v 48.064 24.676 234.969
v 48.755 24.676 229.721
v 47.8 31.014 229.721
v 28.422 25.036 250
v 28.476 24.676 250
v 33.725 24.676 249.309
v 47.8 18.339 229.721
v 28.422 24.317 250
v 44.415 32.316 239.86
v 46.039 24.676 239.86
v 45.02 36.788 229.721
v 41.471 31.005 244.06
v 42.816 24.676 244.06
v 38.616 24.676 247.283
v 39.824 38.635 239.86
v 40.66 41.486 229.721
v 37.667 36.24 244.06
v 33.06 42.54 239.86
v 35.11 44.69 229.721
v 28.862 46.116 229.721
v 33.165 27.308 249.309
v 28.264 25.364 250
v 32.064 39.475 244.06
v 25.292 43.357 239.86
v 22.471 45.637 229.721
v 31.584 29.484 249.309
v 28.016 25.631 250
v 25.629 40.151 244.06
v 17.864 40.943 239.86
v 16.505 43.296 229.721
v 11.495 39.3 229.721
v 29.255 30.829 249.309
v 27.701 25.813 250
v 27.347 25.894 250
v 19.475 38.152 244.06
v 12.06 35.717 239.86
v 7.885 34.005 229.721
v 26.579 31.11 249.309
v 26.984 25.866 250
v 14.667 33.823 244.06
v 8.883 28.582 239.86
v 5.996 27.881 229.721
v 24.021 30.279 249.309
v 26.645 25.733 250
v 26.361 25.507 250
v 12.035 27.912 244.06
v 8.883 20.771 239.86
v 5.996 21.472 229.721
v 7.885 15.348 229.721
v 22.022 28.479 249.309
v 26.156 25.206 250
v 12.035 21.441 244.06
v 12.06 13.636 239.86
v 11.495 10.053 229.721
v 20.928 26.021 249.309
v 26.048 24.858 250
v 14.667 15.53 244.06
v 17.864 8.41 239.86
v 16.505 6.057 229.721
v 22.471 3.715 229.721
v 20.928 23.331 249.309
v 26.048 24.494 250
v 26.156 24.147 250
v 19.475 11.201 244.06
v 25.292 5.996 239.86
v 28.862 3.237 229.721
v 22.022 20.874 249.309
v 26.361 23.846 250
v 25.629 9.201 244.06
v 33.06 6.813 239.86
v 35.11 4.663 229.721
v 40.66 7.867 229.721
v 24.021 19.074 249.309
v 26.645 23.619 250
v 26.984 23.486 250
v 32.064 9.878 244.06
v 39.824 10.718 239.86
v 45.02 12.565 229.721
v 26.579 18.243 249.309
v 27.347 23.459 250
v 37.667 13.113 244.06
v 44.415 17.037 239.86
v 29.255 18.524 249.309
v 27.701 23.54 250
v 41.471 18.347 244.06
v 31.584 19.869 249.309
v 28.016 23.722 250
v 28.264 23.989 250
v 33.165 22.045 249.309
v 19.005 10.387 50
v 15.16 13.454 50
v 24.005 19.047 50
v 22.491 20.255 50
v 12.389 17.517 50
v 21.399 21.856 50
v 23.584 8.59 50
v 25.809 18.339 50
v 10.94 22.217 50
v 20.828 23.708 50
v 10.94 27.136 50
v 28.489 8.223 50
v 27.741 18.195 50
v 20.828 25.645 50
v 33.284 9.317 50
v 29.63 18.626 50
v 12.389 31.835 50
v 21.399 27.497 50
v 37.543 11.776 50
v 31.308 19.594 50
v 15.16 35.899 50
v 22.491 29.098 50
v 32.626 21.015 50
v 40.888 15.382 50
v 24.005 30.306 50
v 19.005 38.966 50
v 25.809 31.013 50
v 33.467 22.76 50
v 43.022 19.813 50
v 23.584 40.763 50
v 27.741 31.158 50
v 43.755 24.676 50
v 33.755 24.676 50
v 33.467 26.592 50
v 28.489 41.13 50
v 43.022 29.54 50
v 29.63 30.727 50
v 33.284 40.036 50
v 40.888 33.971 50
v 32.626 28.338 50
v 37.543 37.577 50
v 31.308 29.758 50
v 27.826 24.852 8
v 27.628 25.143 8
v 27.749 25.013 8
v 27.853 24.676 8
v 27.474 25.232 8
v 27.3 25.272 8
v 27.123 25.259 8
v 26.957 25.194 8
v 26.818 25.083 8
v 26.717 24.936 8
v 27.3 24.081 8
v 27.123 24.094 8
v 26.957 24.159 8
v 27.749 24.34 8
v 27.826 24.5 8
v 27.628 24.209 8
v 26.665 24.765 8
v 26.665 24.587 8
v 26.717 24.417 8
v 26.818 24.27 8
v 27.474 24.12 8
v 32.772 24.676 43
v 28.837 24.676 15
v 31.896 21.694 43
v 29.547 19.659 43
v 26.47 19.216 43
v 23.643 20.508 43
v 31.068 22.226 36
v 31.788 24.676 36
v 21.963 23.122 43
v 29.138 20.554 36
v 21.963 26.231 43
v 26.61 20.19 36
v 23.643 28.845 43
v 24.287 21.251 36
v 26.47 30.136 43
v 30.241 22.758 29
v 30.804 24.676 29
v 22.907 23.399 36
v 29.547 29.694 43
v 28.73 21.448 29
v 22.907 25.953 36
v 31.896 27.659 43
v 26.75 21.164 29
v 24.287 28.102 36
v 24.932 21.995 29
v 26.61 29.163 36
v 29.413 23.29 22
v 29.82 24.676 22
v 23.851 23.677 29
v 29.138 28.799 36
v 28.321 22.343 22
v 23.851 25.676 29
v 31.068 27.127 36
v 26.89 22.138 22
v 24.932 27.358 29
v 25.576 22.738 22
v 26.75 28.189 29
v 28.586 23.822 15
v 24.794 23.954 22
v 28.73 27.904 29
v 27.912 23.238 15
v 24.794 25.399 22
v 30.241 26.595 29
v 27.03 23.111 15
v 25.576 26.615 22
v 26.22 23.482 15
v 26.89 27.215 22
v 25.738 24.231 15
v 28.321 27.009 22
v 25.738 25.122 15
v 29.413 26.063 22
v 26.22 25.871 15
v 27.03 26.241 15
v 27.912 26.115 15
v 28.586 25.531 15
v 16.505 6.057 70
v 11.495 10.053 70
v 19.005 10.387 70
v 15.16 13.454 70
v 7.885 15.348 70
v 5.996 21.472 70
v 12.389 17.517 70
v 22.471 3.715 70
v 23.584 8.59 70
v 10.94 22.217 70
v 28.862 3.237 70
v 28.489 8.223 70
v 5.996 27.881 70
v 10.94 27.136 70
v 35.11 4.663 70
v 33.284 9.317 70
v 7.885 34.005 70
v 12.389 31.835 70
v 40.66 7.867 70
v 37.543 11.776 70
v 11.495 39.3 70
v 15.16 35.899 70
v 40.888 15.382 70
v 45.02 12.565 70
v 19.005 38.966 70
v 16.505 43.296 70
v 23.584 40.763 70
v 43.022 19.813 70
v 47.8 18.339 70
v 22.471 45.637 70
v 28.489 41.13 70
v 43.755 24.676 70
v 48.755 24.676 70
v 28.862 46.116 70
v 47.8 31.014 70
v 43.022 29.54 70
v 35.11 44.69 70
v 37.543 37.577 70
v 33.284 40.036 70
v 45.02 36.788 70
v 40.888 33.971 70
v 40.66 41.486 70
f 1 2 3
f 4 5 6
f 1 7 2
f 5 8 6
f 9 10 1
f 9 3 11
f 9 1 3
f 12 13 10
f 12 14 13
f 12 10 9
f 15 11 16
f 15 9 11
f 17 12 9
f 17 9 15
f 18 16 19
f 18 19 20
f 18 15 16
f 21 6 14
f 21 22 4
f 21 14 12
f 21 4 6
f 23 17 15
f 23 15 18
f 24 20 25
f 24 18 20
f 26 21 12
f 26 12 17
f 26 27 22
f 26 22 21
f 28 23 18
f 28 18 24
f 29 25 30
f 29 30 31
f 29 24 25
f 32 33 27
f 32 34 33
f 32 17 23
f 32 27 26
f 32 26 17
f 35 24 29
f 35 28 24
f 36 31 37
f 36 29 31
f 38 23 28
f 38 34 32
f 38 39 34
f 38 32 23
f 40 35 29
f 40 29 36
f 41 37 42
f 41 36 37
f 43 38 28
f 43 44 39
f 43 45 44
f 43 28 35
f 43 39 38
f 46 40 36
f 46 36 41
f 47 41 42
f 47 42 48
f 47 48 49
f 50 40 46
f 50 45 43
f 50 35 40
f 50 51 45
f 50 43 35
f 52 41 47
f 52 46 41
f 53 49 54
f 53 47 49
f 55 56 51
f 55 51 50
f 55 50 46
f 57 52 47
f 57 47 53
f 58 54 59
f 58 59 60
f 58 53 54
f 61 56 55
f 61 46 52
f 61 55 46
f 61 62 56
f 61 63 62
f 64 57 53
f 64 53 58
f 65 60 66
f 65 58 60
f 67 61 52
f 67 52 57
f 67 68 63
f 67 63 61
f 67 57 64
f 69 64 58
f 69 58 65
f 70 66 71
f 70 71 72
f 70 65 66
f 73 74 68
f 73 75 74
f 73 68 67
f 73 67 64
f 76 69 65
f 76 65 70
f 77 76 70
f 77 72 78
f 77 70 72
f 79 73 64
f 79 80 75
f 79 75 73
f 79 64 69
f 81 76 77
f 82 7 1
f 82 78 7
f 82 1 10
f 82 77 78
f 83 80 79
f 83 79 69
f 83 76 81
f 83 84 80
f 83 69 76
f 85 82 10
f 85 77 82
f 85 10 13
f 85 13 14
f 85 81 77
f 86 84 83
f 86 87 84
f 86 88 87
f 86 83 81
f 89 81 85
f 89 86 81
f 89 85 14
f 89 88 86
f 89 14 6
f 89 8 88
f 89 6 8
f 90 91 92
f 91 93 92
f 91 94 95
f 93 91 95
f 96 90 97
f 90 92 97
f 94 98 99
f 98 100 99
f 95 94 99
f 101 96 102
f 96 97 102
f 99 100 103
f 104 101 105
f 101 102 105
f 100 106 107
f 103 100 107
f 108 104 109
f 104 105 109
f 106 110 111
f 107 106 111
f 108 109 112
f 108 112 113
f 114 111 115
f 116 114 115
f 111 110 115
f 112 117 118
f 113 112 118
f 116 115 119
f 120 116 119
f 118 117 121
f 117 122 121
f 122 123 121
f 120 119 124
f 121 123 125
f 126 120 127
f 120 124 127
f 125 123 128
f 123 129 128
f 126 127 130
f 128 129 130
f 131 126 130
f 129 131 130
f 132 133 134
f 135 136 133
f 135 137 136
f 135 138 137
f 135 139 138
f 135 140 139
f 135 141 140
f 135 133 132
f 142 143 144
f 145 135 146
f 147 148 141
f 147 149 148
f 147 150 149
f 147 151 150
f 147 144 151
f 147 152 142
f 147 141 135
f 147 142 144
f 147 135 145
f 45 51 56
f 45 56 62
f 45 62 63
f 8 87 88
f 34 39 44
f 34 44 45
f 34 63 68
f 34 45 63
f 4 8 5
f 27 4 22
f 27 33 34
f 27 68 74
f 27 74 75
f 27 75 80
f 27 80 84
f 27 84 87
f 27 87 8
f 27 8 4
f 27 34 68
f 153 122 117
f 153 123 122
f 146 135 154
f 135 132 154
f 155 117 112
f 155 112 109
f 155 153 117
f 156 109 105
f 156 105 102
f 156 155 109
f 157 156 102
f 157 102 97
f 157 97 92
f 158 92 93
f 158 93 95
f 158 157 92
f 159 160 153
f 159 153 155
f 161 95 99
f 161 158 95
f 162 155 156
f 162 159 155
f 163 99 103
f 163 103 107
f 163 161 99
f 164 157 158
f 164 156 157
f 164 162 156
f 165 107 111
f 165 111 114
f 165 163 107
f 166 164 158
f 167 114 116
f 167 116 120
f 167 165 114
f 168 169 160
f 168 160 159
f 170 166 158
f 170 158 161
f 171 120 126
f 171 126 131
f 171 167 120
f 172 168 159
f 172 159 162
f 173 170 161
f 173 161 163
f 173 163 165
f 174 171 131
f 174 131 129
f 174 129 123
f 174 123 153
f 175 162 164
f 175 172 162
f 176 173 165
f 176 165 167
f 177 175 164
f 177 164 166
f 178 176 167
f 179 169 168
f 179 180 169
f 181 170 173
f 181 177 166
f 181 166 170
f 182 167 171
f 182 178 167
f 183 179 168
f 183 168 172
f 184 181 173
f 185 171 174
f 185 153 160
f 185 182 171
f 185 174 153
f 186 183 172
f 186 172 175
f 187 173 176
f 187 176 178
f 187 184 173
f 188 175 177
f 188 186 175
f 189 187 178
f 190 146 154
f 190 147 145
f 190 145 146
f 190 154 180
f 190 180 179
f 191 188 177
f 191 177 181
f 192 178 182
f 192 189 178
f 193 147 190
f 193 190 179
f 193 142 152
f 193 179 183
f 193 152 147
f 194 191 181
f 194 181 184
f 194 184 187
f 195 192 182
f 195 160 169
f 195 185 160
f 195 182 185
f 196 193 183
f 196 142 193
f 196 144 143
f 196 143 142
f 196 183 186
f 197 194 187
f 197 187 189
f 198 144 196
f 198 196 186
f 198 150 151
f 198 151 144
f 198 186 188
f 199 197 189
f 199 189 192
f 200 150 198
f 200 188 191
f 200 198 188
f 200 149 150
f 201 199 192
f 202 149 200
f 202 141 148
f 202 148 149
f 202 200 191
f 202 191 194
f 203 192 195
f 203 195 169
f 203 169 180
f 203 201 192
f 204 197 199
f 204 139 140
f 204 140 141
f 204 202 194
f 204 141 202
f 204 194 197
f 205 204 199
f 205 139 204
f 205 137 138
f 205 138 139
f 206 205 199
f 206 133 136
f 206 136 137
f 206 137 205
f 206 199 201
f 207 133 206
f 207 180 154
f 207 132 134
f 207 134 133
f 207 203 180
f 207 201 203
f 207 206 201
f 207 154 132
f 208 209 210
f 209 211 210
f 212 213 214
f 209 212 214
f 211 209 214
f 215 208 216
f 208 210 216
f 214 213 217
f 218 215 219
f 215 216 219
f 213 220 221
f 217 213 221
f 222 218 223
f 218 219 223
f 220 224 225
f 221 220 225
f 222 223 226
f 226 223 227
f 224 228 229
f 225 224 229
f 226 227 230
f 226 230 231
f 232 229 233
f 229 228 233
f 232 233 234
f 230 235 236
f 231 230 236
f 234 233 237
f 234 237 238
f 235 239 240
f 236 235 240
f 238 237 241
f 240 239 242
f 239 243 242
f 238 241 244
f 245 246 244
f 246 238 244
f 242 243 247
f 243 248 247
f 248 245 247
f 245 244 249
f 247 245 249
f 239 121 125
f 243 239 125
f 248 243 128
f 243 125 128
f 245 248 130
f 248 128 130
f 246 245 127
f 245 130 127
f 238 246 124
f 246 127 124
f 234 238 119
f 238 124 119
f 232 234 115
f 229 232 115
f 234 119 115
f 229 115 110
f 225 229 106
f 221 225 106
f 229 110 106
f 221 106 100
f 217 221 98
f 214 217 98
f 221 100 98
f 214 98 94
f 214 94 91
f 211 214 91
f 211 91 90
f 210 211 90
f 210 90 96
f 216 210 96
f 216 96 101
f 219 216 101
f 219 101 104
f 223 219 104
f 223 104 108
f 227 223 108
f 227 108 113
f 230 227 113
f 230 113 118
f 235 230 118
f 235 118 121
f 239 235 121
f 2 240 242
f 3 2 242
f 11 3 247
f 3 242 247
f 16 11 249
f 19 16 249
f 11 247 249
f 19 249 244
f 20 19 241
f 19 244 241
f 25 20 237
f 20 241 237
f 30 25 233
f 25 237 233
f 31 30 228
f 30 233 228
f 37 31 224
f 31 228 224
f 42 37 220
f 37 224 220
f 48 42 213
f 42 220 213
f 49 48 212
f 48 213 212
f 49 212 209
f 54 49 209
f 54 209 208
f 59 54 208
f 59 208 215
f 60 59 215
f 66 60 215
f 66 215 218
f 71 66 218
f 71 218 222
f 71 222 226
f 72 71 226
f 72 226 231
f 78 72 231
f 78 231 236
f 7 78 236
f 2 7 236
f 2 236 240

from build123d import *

# Parameters (mm, degrees)
F1_START = 50
F0_R     = 21.5
F0_R_2   = 16.5
F1_DEPTH = 200
F2_DEPTH = 70
F3_R     = 6.5
F4_DEPTH = 42
F4_TAPER = 8
F5_R     = 20.2793939239


with BuildPart() as f1:
    # F0 (on Top) → F1 (new body)
    with BuildSketch(Plane.XY.offset(F1_START)):
        with Locations((27.2554606199, 24.6764030308)):
            Circle(F0_R)
        with Locations((27.2554606199, 24.6764030308)):
            Circle(F0_R_2, mode=Mode.SUBTRACT)
        with Locations((27.2554606199, 24.6764030308)):
            Circle(F0_R_2)
    extrude(amount=F1_DEPTH)

    # F0 (on Top) → F2 (cut)
    with BuildSketch(Plane.XY):
        with Locations((27.2554606199, 24.6764030308)):
            Circle(F0_R)
        with Locations((27.2554606199, 24.6764030308)):
            Circle(F0_R_2, mode=Mode.SUBTRACT)
    extrude(amount=F2_DEPTH, mode=Mode.SUBTRACT)

    # F3 (on face) → F4 (join)
    with BuildSketch(Plane(origin=(0, 0, 50), x_dir=(1, 0, 0), z_dir=(0, 0, -1))):
        with Locations((27.2554606199, -24.6764030308)):
            Circle(F3_R)
    extrude(amount=F4_DEPTH, taper=F4_TAPER)

    # F5
    f5_edges = [f1.edges().sort_by_distance(p)[0] for p in [
        (5.755461, 24.676403, 250),
    ]]
    fillet(f5_edges, radius=F5_R)


solid = f1.part
